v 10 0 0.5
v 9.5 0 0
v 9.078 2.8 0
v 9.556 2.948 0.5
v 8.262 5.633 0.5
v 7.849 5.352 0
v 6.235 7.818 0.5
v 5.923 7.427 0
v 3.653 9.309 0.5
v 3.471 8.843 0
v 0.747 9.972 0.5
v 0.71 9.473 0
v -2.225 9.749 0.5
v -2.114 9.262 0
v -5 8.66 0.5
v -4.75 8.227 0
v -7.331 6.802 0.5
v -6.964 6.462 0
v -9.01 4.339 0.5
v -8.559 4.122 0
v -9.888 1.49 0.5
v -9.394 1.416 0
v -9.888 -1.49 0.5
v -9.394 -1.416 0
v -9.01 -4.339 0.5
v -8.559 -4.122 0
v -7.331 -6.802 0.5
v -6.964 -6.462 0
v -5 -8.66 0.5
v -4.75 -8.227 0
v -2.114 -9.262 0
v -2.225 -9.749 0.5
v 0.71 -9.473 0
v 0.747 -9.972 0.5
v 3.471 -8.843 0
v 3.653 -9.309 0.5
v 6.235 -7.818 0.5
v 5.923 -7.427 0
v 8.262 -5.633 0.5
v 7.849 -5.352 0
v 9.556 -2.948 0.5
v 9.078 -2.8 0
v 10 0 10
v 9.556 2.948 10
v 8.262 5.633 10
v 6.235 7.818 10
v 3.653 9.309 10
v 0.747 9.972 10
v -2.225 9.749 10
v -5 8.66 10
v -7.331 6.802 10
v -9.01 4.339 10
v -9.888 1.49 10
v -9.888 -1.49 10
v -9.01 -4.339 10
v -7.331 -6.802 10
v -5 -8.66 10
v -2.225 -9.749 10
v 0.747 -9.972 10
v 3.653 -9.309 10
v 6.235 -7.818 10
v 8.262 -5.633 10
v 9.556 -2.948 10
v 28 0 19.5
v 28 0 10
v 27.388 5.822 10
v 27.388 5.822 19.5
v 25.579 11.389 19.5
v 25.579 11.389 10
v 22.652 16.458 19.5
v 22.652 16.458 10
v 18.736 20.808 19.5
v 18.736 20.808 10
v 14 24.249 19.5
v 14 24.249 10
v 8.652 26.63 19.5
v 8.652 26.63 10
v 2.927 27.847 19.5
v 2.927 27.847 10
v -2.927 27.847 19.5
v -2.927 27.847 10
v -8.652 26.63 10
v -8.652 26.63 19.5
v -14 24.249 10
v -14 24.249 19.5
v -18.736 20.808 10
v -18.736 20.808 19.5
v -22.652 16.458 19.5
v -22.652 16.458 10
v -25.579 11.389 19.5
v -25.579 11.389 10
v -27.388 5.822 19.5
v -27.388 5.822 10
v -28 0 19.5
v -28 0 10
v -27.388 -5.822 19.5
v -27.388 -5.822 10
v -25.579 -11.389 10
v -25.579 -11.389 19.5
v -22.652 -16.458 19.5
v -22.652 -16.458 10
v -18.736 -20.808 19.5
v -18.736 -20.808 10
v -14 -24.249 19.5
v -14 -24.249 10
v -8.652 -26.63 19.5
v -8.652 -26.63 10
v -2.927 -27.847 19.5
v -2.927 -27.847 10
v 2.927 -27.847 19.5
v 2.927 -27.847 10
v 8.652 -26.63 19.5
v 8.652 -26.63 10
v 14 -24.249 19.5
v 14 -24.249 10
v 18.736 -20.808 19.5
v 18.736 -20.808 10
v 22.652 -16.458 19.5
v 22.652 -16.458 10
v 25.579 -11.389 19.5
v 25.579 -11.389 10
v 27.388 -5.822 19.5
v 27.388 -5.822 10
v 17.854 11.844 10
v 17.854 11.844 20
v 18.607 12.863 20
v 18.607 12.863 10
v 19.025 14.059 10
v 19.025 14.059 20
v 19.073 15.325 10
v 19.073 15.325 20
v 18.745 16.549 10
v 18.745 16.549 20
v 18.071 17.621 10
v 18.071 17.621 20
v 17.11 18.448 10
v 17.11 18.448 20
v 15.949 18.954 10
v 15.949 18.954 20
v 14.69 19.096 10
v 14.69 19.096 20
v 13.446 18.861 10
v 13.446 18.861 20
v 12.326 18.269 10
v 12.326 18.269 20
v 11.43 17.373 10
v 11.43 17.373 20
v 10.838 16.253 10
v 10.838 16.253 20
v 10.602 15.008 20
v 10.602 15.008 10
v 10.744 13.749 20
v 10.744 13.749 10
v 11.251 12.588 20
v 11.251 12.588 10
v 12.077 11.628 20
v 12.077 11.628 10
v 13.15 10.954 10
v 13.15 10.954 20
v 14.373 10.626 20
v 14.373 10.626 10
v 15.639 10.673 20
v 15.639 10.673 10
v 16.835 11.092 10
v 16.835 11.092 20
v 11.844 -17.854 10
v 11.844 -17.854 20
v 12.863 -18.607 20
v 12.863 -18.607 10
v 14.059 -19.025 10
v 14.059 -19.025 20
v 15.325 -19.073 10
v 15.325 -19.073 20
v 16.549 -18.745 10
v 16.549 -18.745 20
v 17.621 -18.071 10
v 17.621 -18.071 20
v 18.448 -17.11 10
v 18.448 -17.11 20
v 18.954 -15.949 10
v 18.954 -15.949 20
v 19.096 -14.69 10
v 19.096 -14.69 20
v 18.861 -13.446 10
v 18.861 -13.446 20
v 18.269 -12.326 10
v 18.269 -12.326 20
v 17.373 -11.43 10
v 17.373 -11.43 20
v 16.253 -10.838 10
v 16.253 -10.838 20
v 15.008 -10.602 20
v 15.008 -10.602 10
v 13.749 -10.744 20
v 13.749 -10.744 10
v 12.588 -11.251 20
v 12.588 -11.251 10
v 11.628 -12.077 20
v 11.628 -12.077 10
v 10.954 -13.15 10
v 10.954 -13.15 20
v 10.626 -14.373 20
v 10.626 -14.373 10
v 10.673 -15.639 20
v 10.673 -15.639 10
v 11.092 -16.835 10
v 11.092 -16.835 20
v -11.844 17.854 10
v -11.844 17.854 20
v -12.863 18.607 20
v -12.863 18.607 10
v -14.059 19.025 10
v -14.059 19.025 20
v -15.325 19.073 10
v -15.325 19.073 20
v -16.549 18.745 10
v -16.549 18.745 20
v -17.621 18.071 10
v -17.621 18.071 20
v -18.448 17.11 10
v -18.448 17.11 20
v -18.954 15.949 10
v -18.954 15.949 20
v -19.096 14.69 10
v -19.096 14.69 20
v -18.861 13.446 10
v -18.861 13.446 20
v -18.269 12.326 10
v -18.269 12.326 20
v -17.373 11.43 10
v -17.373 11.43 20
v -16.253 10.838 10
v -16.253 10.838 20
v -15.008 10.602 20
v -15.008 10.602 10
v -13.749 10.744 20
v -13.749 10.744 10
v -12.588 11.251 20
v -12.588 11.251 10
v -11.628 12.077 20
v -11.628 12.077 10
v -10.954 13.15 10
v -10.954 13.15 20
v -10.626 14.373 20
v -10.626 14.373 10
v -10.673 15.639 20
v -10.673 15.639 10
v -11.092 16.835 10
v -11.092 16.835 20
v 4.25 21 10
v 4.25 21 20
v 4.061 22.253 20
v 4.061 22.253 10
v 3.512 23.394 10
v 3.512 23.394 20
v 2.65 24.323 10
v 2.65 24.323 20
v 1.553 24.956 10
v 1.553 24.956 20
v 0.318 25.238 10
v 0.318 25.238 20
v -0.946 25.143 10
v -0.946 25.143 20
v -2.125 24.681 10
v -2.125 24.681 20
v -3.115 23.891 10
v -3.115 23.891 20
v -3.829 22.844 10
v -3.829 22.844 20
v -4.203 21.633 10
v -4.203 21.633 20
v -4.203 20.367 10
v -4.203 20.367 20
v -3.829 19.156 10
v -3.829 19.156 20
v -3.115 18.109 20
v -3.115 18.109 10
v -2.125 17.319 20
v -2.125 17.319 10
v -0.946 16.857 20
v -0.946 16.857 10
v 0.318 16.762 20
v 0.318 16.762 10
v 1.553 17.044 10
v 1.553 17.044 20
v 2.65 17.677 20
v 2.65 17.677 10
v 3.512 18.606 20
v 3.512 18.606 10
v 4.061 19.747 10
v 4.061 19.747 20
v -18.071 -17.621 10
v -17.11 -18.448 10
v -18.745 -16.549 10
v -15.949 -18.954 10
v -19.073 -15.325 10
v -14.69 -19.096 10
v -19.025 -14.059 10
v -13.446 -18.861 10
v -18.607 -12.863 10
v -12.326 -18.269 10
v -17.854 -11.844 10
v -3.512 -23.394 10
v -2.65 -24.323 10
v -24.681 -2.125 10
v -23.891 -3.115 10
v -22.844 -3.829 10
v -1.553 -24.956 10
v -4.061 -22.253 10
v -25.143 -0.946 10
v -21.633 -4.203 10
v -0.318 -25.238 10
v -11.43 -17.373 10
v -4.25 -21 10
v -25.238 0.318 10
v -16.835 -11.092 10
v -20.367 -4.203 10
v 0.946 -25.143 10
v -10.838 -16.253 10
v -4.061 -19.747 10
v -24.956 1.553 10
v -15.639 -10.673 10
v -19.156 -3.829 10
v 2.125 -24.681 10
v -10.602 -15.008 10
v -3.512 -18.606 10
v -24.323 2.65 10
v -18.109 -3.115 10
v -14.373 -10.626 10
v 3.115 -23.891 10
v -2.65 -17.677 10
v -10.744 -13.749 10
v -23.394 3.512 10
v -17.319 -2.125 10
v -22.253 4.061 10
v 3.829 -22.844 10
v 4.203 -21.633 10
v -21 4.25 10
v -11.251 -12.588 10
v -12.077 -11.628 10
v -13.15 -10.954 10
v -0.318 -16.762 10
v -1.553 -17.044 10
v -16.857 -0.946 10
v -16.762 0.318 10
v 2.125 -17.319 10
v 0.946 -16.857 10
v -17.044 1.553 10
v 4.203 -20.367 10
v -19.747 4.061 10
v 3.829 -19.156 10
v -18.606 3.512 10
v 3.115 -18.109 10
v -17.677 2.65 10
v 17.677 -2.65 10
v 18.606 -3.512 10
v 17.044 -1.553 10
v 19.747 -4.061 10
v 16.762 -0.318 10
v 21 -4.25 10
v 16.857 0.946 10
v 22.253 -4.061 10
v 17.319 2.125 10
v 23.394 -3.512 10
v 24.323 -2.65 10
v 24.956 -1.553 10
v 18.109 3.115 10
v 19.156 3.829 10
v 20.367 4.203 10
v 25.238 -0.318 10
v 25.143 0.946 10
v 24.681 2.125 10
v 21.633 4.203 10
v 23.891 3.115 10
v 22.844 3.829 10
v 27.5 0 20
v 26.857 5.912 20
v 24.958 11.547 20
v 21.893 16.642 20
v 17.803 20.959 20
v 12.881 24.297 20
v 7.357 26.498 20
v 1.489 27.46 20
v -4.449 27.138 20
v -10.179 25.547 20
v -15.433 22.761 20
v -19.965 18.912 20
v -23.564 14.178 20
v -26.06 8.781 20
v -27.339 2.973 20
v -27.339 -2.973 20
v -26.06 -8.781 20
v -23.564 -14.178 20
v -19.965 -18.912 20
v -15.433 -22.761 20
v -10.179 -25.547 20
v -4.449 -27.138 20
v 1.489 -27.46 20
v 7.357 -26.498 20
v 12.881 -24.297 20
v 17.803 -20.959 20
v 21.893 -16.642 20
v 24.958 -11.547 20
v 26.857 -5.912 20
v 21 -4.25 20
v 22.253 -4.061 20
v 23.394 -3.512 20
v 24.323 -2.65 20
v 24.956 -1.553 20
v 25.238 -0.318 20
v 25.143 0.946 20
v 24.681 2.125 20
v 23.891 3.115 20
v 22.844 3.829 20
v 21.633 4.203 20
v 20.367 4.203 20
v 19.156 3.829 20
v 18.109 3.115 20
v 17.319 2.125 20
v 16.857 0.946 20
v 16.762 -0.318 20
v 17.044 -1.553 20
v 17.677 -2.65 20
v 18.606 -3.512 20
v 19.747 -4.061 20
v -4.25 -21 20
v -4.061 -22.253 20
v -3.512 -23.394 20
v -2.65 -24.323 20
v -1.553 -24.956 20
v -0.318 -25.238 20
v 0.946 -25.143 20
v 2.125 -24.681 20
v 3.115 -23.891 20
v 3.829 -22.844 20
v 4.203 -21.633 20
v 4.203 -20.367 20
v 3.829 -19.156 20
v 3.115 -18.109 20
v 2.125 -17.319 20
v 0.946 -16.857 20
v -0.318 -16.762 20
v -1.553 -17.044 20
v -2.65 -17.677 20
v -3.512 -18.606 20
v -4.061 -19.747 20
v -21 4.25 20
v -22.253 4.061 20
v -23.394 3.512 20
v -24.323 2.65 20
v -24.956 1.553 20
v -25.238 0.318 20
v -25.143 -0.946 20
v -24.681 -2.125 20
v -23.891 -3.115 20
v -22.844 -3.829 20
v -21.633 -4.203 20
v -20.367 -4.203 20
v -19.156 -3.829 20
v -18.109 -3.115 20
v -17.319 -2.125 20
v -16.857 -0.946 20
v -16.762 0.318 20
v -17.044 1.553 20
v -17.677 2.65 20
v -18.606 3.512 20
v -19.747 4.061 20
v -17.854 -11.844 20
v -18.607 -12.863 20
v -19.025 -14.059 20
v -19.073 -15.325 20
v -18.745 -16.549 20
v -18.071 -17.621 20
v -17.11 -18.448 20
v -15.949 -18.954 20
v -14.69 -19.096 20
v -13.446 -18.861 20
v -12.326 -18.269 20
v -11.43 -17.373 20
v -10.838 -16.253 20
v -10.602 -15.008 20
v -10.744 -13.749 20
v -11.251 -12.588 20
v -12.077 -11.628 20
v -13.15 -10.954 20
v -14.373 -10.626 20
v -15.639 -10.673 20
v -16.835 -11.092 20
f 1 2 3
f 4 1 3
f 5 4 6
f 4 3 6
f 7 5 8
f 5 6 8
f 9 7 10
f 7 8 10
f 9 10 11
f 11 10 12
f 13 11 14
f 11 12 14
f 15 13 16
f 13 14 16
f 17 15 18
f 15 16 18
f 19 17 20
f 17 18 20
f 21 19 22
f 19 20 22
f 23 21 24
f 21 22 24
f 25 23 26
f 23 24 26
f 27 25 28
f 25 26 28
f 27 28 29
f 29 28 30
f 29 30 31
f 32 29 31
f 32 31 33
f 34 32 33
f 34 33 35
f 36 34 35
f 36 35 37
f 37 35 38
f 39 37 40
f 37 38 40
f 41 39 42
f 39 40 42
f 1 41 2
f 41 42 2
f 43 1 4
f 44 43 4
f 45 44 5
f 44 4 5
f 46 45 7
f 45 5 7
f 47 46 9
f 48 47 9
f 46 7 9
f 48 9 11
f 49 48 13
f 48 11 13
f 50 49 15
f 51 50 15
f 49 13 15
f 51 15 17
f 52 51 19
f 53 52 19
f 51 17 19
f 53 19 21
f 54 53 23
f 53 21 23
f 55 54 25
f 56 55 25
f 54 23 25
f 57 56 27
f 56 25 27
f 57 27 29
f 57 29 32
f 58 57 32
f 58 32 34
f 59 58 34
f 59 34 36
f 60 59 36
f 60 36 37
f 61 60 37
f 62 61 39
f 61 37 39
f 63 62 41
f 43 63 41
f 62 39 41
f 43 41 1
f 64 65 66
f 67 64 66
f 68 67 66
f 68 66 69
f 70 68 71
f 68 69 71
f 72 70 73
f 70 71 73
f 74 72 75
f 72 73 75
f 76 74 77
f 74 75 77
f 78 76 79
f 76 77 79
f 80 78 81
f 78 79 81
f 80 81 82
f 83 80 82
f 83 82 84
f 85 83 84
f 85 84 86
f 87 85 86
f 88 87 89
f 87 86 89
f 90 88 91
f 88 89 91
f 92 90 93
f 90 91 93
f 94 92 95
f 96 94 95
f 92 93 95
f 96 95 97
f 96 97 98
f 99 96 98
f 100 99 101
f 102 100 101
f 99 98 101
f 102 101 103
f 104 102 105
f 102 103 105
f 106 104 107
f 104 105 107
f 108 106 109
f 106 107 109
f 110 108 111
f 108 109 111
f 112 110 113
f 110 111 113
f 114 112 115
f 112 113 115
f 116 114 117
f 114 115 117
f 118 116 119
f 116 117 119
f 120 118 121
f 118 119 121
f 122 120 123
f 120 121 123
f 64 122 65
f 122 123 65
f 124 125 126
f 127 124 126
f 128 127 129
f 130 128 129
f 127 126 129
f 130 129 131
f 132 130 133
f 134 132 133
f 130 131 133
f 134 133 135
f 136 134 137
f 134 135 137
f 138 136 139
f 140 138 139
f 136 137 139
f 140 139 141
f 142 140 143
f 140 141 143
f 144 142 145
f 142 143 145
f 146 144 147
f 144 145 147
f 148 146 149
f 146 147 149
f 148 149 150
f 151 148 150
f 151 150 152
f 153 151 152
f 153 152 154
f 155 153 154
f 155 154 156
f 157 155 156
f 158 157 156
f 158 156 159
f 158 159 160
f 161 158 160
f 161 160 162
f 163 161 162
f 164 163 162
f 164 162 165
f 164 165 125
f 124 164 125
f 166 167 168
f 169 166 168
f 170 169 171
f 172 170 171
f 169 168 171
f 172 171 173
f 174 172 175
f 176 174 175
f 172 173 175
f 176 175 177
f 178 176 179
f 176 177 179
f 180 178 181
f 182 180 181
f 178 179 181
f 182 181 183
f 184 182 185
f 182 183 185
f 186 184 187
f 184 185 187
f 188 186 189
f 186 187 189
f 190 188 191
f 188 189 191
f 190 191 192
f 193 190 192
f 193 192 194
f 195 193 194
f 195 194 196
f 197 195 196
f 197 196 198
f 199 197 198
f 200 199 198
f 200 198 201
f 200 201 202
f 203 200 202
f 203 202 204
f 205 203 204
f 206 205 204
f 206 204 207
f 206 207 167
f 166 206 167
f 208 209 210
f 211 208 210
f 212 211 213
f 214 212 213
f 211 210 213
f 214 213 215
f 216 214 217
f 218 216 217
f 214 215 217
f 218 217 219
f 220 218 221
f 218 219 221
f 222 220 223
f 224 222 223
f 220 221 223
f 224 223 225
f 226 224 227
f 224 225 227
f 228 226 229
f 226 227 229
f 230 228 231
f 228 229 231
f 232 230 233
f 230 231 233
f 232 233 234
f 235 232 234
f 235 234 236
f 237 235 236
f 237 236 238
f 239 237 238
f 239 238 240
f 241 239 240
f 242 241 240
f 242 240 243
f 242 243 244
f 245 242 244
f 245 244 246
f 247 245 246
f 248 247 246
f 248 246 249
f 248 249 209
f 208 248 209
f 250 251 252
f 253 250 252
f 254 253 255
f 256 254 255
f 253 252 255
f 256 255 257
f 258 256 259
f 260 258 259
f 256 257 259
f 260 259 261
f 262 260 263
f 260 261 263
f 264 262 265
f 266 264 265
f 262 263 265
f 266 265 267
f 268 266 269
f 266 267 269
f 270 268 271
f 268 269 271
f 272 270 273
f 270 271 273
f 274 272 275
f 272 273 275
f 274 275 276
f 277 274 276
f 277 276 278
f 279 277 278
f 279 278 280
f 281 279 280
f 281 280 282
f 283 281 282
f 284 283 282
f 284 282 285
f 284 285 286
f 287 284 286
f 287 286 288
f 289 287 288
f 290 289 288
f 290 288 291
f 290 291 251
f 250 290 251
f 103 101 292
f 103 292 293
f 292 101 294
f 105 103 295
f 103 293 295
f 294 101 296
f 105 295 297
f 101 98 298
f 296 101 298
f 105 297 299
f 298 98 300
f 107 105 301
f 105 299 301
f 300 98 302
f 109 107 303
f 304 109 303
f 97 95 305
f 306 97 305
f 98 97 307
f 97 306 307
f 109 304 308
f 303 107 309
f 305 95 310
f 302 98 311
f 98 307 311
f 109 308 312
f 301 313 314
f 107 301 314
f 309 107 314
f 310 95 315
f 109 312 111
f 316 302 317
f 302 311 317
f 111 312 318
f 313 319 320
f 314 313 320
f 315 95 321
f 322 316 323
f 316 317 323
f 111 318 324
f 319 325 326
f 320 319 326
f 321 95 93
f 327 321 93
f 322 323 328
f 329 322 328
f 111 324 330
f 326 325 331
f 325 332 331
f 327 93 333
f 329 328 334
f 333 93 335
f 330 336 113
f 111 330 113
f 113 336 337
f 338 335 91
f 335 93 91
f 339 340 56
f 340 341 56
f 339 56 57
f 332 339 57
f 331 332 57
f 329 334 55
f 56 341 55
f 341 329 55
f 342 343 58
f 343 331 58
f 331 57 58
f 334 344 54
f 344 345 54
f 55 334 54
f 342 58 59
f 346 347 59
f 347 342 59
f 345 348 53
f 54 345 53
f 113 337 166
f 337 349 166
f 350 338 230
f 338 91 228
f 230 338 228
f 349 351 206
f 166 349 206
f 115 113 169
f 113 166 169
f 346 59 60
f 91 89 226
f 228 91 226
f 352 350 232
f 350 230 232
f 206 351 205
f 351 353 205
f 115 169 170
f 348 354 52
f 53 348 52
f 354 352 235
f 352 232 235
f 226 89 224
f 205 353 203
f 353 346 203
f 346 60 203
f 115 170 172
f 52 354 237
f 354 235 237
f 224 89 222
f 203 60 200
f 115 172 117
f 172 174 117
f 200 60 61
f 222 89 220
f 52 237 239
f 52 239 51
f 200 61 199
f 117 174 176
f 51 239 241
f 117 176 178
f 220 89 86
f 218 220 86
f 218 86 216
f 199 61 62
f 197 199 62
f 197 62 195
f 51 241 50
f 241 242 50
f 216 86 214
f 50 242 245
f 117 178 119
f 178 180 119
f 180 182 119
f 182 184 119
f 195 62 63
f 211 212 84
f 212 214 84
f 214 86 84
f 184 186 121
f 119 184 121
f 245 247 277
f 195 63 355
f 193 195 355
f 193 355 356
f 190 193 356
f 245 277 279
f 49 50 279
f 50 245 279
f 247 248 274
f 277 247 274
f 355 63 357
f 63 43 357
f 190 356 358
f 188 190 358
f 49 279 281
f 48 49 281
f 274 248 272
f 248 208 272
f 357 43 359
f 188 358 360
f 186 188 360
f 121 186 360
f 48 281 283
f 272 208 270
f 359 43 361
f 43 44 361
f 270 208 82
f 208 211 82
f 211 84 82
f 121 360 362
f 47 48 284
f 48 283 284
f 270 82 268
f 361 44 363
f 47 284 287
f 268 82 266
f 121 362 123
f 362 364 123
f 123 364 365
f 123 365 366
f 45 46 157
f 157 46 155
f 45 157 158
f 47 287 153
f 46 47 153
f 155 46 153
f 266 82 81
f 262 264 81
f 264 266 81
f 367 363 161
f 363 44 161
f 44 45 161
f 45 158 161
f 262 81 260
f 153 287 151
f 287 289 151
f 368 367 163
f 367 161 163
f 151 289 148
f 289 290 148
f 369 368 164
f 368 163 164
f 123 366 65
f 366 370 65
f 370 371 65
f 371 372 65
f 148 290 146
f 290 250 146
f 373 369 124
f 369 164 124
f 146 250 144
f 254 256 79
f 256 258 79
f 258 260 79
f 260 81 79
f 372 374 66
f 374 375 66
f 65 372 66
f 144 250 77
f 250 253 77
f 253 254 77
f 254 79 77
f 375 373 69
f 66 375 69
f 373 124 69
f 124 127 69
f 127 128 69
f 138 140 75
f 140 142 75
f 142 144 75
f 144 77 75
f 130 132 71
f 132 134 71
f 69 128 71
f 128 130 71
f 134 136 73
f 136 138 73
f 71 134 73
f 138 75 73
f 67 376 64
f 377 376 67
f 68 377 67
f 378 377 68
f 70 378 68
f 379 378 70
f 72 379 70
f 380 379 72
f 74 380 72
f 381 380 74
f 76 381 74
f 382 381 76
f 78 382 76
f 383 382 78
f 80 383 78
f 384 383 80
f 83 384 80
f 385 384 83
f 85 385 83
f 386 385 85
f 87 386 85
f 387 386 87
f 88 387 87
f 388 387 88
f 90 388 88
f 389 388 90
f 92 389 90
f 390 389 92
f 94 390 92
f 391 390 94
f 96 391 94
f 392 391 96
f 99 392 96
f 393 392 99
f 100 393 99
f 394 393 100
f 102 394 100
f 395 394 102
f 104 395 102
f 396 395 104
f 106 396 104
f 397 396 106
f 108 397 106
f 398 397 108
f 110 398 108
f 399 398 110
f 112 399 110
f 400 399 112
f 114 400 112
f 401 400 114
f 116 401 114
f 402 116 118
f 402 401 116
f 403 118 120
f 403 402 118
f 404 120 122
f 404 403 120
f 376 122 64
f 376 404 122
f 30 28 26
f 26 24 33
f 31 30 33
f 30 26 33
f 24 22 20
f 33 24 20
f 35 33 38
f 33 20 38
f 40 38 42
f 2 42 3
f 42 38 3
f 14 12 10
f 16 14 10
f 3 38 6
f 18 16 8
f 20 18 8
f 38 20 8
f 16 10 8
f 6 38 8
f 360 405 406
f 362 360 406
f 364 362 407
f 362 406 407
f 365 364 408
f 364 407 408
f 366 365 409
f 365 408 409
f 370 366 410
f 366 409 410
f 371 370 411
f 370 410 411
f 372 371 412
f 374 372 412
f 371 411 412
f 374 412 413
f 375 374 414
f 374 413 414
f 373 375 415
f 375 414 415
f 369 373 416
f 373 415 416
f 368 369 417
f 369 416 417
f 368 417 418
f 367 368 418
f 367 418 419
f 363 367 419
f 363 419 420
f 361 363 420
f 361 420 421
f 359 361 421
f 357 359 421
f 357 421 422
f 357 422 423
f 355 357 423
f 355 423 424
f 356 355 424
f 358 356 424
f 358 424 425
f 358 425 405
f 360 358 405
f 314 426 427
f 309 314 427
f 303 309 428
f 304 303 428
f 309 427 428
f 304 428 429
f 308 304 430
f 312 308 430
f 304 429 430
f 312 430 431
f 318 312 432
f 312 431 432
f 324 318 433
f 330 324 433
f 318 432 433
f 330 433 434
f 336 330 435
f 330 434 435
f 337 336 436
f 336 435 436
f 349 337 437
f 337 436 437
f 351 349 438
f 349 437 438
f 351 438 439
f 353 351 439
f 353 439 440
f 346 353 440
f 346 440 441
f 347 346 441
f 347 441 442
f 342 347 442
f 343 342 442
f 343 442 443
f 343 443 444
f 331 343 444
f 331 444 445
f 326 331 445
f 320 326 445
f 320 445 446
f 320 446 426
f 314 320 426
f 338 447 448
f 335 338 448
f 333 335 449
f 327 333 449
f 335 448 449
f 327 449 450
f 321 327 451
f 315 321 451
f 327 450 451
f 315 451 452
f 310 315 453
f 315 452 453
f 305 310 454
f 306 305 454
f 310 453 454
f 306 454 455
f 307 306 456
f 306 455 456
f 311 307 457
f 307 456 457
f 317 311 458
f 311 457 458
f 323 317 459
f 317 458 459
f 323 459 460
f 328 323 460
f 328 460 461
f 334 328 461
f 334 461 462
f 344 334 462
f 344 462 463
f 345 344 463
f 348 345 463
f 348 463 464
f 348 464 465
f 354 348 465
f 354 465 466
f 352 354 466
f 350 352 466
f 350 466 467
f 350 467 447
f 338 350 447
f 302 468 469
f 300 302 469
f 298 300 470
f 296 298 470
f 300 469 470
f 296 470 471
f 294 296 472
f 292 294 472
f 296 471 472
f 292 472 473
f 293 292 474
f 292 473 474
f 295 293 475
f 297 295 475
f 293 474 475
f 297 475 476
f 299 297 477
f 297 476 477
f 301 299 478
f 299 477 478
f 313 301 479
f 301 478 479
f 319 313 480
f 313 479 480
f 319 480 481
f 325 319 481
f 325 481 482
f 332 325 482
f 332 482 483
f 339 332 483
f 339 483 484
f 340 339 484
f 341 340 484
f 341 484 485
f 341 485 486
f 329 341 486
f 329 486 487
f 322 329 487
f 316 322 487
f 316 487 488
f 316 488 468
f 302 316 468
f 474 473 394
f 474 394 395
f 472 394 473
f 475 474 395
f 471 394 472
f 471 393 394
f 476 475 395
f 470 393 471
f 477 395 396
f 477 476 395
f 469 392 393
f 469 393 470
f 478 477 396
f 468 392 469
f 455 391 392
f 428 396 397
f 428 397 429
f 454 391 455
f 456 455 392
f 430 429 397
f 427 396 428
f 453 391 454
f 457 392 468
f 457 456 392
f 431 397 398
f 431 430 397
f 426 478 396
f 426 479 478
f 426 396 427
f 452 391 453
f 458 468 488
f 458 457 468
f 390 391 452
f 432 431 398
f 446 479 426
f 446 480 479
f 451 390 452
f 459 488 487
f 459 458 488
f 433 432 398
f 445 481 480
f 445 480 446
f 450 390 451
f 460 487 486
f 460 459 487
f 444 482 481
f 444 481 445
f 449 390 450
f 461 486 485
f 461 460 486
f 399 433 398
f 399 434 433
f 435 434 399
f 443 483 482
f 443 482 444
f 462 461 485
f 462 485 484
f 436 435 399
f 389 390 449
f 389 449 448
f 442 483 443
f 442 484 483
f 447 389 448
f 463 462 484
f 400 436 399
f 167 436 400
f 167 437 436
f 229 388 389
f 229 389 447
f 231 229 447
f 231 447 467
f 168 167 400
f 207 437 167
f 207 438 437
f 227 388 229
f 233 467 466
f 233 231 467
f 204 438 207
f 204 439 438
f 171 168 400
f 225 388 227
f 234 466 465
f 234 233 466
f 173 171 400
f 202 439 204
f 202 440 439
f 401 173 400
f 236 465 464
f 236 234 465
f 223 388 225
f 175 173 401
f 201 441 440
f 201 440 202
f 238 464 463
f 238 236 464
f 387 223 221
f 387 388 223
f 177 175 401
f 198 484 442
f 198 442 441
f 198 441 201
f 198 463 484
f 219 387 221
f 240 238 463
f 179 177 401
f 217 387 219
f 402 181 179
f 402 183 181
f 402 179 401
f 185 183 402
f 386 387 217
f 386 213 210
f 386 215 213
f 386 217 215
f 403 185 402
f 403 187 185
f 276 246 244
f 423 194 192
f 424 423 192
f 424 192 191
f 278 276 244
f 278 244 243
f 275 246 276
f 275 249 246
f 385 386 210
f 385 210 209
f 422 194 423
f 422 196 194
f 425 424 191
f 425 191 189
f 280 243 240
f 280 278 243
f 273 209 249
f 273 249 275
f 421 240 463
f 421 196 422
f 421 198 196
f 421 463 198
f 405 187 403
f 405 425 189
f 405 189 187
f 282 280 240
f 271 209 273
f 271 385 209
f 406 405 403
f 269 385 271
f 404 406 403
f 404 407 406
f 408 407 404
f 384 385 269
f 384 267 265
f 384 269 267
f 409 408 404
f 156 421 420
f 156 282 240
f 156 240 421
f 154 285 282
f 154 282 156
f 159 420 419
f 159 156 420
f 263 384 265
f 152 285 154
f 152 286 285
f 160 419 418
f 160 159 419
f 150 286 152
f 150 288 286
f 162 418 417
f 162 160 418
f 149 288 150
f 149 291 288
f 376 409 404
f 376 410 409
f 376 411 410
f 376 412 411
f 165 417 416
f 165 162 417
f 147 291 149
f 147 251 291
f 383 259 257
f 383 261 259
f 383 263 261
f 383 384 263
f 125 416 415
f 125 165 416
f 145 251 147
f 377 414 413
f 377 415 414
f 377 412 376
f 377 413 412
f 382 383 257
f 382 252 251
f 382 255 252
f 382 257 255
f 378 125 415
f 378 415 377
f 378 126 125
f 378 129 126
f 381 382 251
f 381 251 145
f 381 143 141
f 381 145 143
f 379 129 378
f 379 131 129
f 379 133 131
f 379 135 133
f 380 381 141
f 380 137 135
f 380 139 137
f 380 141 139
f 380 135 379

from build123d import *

# Parameters (mm, degrees)
SCHIZZO1_R                   = 10
ESTRUSIONE_ESTRUSIONE1_DEPTH = 10
SCHIZZO2_R                   = 28
ESTRUSIONE_ESTRUSIONE2_DEPTH = 10
SCHIZZO3_R                   = 4.25
TAGLIO_ESTRUSIONE1_DEPTH     = 45.362146026
RIPETIZIONECIRCOLARE1_COUNT  = 8
SMUSSO1_SIZE                 = 0.5
SMUSSO2_SIZE                 = 0.5


with BuildPart() as part:
    # Schizzo1 → Estrusione-Estrusione1 (new body)
    with BuildSketch(Plane.XY):
        Circle(SCHIZZO1_R)
    extrude(amount=ESTRUSIONE_ESTRUSIONE1_DEPTH)

    # Schizzo2 → Estrusione-Estrusione2 (add)
    with BuildSketch(Plane.XY.offset(10)):
        Circle(SCHIZZO2_R)
    extrude(amount=ESTRUSIONE_ESTRUSIONE2_DEPTH)

    # Schizzo3 → Taglio-Estrusione1 (cut, through all)
    with BuildSketch(Plane.XY.offset(20)):
        with Locations((0, 21)):
            Circle(SCHIZZO3_R)
    taglio_estrusione1 = extrude(amount=-TAGLIO_ESTRUSIONE1_DEPTH, mode=Mode.SUBTRACT)

    # RipetizioneCircolare1: Taglio-Estrusione1 ×8 about axis
    ripetizionecircolare1_axis = Axis((0, 0, 0), (0, 0, 1))
    for i in range(1, RIPETIZIONECIRCOLARE1_COUNT):
        add(taglio_estrusione1.rotate(ripetizionecircolare1_axis, i * 360 / RIPETIZIONECIRCOLARE1_COUNT), mode=Mode.SUBTRACT)

    # Smusso1
    smusso1_edges = [part.edges().sort_by_distance(p)[0] for p in [
        (-10, 0, 0),
    ]]
    chamfer(smusso1_edges, length=SMUSSO1_SIZE)

    # Smusso2
    smusso2_edges = [part.edges().sort_by_distance(p)[0] for p in [
        (-28, 0, 20),
    ]]
    chamfer(smusso2_edges, length=SMUSSO2_SIZE)


solid = part.part
